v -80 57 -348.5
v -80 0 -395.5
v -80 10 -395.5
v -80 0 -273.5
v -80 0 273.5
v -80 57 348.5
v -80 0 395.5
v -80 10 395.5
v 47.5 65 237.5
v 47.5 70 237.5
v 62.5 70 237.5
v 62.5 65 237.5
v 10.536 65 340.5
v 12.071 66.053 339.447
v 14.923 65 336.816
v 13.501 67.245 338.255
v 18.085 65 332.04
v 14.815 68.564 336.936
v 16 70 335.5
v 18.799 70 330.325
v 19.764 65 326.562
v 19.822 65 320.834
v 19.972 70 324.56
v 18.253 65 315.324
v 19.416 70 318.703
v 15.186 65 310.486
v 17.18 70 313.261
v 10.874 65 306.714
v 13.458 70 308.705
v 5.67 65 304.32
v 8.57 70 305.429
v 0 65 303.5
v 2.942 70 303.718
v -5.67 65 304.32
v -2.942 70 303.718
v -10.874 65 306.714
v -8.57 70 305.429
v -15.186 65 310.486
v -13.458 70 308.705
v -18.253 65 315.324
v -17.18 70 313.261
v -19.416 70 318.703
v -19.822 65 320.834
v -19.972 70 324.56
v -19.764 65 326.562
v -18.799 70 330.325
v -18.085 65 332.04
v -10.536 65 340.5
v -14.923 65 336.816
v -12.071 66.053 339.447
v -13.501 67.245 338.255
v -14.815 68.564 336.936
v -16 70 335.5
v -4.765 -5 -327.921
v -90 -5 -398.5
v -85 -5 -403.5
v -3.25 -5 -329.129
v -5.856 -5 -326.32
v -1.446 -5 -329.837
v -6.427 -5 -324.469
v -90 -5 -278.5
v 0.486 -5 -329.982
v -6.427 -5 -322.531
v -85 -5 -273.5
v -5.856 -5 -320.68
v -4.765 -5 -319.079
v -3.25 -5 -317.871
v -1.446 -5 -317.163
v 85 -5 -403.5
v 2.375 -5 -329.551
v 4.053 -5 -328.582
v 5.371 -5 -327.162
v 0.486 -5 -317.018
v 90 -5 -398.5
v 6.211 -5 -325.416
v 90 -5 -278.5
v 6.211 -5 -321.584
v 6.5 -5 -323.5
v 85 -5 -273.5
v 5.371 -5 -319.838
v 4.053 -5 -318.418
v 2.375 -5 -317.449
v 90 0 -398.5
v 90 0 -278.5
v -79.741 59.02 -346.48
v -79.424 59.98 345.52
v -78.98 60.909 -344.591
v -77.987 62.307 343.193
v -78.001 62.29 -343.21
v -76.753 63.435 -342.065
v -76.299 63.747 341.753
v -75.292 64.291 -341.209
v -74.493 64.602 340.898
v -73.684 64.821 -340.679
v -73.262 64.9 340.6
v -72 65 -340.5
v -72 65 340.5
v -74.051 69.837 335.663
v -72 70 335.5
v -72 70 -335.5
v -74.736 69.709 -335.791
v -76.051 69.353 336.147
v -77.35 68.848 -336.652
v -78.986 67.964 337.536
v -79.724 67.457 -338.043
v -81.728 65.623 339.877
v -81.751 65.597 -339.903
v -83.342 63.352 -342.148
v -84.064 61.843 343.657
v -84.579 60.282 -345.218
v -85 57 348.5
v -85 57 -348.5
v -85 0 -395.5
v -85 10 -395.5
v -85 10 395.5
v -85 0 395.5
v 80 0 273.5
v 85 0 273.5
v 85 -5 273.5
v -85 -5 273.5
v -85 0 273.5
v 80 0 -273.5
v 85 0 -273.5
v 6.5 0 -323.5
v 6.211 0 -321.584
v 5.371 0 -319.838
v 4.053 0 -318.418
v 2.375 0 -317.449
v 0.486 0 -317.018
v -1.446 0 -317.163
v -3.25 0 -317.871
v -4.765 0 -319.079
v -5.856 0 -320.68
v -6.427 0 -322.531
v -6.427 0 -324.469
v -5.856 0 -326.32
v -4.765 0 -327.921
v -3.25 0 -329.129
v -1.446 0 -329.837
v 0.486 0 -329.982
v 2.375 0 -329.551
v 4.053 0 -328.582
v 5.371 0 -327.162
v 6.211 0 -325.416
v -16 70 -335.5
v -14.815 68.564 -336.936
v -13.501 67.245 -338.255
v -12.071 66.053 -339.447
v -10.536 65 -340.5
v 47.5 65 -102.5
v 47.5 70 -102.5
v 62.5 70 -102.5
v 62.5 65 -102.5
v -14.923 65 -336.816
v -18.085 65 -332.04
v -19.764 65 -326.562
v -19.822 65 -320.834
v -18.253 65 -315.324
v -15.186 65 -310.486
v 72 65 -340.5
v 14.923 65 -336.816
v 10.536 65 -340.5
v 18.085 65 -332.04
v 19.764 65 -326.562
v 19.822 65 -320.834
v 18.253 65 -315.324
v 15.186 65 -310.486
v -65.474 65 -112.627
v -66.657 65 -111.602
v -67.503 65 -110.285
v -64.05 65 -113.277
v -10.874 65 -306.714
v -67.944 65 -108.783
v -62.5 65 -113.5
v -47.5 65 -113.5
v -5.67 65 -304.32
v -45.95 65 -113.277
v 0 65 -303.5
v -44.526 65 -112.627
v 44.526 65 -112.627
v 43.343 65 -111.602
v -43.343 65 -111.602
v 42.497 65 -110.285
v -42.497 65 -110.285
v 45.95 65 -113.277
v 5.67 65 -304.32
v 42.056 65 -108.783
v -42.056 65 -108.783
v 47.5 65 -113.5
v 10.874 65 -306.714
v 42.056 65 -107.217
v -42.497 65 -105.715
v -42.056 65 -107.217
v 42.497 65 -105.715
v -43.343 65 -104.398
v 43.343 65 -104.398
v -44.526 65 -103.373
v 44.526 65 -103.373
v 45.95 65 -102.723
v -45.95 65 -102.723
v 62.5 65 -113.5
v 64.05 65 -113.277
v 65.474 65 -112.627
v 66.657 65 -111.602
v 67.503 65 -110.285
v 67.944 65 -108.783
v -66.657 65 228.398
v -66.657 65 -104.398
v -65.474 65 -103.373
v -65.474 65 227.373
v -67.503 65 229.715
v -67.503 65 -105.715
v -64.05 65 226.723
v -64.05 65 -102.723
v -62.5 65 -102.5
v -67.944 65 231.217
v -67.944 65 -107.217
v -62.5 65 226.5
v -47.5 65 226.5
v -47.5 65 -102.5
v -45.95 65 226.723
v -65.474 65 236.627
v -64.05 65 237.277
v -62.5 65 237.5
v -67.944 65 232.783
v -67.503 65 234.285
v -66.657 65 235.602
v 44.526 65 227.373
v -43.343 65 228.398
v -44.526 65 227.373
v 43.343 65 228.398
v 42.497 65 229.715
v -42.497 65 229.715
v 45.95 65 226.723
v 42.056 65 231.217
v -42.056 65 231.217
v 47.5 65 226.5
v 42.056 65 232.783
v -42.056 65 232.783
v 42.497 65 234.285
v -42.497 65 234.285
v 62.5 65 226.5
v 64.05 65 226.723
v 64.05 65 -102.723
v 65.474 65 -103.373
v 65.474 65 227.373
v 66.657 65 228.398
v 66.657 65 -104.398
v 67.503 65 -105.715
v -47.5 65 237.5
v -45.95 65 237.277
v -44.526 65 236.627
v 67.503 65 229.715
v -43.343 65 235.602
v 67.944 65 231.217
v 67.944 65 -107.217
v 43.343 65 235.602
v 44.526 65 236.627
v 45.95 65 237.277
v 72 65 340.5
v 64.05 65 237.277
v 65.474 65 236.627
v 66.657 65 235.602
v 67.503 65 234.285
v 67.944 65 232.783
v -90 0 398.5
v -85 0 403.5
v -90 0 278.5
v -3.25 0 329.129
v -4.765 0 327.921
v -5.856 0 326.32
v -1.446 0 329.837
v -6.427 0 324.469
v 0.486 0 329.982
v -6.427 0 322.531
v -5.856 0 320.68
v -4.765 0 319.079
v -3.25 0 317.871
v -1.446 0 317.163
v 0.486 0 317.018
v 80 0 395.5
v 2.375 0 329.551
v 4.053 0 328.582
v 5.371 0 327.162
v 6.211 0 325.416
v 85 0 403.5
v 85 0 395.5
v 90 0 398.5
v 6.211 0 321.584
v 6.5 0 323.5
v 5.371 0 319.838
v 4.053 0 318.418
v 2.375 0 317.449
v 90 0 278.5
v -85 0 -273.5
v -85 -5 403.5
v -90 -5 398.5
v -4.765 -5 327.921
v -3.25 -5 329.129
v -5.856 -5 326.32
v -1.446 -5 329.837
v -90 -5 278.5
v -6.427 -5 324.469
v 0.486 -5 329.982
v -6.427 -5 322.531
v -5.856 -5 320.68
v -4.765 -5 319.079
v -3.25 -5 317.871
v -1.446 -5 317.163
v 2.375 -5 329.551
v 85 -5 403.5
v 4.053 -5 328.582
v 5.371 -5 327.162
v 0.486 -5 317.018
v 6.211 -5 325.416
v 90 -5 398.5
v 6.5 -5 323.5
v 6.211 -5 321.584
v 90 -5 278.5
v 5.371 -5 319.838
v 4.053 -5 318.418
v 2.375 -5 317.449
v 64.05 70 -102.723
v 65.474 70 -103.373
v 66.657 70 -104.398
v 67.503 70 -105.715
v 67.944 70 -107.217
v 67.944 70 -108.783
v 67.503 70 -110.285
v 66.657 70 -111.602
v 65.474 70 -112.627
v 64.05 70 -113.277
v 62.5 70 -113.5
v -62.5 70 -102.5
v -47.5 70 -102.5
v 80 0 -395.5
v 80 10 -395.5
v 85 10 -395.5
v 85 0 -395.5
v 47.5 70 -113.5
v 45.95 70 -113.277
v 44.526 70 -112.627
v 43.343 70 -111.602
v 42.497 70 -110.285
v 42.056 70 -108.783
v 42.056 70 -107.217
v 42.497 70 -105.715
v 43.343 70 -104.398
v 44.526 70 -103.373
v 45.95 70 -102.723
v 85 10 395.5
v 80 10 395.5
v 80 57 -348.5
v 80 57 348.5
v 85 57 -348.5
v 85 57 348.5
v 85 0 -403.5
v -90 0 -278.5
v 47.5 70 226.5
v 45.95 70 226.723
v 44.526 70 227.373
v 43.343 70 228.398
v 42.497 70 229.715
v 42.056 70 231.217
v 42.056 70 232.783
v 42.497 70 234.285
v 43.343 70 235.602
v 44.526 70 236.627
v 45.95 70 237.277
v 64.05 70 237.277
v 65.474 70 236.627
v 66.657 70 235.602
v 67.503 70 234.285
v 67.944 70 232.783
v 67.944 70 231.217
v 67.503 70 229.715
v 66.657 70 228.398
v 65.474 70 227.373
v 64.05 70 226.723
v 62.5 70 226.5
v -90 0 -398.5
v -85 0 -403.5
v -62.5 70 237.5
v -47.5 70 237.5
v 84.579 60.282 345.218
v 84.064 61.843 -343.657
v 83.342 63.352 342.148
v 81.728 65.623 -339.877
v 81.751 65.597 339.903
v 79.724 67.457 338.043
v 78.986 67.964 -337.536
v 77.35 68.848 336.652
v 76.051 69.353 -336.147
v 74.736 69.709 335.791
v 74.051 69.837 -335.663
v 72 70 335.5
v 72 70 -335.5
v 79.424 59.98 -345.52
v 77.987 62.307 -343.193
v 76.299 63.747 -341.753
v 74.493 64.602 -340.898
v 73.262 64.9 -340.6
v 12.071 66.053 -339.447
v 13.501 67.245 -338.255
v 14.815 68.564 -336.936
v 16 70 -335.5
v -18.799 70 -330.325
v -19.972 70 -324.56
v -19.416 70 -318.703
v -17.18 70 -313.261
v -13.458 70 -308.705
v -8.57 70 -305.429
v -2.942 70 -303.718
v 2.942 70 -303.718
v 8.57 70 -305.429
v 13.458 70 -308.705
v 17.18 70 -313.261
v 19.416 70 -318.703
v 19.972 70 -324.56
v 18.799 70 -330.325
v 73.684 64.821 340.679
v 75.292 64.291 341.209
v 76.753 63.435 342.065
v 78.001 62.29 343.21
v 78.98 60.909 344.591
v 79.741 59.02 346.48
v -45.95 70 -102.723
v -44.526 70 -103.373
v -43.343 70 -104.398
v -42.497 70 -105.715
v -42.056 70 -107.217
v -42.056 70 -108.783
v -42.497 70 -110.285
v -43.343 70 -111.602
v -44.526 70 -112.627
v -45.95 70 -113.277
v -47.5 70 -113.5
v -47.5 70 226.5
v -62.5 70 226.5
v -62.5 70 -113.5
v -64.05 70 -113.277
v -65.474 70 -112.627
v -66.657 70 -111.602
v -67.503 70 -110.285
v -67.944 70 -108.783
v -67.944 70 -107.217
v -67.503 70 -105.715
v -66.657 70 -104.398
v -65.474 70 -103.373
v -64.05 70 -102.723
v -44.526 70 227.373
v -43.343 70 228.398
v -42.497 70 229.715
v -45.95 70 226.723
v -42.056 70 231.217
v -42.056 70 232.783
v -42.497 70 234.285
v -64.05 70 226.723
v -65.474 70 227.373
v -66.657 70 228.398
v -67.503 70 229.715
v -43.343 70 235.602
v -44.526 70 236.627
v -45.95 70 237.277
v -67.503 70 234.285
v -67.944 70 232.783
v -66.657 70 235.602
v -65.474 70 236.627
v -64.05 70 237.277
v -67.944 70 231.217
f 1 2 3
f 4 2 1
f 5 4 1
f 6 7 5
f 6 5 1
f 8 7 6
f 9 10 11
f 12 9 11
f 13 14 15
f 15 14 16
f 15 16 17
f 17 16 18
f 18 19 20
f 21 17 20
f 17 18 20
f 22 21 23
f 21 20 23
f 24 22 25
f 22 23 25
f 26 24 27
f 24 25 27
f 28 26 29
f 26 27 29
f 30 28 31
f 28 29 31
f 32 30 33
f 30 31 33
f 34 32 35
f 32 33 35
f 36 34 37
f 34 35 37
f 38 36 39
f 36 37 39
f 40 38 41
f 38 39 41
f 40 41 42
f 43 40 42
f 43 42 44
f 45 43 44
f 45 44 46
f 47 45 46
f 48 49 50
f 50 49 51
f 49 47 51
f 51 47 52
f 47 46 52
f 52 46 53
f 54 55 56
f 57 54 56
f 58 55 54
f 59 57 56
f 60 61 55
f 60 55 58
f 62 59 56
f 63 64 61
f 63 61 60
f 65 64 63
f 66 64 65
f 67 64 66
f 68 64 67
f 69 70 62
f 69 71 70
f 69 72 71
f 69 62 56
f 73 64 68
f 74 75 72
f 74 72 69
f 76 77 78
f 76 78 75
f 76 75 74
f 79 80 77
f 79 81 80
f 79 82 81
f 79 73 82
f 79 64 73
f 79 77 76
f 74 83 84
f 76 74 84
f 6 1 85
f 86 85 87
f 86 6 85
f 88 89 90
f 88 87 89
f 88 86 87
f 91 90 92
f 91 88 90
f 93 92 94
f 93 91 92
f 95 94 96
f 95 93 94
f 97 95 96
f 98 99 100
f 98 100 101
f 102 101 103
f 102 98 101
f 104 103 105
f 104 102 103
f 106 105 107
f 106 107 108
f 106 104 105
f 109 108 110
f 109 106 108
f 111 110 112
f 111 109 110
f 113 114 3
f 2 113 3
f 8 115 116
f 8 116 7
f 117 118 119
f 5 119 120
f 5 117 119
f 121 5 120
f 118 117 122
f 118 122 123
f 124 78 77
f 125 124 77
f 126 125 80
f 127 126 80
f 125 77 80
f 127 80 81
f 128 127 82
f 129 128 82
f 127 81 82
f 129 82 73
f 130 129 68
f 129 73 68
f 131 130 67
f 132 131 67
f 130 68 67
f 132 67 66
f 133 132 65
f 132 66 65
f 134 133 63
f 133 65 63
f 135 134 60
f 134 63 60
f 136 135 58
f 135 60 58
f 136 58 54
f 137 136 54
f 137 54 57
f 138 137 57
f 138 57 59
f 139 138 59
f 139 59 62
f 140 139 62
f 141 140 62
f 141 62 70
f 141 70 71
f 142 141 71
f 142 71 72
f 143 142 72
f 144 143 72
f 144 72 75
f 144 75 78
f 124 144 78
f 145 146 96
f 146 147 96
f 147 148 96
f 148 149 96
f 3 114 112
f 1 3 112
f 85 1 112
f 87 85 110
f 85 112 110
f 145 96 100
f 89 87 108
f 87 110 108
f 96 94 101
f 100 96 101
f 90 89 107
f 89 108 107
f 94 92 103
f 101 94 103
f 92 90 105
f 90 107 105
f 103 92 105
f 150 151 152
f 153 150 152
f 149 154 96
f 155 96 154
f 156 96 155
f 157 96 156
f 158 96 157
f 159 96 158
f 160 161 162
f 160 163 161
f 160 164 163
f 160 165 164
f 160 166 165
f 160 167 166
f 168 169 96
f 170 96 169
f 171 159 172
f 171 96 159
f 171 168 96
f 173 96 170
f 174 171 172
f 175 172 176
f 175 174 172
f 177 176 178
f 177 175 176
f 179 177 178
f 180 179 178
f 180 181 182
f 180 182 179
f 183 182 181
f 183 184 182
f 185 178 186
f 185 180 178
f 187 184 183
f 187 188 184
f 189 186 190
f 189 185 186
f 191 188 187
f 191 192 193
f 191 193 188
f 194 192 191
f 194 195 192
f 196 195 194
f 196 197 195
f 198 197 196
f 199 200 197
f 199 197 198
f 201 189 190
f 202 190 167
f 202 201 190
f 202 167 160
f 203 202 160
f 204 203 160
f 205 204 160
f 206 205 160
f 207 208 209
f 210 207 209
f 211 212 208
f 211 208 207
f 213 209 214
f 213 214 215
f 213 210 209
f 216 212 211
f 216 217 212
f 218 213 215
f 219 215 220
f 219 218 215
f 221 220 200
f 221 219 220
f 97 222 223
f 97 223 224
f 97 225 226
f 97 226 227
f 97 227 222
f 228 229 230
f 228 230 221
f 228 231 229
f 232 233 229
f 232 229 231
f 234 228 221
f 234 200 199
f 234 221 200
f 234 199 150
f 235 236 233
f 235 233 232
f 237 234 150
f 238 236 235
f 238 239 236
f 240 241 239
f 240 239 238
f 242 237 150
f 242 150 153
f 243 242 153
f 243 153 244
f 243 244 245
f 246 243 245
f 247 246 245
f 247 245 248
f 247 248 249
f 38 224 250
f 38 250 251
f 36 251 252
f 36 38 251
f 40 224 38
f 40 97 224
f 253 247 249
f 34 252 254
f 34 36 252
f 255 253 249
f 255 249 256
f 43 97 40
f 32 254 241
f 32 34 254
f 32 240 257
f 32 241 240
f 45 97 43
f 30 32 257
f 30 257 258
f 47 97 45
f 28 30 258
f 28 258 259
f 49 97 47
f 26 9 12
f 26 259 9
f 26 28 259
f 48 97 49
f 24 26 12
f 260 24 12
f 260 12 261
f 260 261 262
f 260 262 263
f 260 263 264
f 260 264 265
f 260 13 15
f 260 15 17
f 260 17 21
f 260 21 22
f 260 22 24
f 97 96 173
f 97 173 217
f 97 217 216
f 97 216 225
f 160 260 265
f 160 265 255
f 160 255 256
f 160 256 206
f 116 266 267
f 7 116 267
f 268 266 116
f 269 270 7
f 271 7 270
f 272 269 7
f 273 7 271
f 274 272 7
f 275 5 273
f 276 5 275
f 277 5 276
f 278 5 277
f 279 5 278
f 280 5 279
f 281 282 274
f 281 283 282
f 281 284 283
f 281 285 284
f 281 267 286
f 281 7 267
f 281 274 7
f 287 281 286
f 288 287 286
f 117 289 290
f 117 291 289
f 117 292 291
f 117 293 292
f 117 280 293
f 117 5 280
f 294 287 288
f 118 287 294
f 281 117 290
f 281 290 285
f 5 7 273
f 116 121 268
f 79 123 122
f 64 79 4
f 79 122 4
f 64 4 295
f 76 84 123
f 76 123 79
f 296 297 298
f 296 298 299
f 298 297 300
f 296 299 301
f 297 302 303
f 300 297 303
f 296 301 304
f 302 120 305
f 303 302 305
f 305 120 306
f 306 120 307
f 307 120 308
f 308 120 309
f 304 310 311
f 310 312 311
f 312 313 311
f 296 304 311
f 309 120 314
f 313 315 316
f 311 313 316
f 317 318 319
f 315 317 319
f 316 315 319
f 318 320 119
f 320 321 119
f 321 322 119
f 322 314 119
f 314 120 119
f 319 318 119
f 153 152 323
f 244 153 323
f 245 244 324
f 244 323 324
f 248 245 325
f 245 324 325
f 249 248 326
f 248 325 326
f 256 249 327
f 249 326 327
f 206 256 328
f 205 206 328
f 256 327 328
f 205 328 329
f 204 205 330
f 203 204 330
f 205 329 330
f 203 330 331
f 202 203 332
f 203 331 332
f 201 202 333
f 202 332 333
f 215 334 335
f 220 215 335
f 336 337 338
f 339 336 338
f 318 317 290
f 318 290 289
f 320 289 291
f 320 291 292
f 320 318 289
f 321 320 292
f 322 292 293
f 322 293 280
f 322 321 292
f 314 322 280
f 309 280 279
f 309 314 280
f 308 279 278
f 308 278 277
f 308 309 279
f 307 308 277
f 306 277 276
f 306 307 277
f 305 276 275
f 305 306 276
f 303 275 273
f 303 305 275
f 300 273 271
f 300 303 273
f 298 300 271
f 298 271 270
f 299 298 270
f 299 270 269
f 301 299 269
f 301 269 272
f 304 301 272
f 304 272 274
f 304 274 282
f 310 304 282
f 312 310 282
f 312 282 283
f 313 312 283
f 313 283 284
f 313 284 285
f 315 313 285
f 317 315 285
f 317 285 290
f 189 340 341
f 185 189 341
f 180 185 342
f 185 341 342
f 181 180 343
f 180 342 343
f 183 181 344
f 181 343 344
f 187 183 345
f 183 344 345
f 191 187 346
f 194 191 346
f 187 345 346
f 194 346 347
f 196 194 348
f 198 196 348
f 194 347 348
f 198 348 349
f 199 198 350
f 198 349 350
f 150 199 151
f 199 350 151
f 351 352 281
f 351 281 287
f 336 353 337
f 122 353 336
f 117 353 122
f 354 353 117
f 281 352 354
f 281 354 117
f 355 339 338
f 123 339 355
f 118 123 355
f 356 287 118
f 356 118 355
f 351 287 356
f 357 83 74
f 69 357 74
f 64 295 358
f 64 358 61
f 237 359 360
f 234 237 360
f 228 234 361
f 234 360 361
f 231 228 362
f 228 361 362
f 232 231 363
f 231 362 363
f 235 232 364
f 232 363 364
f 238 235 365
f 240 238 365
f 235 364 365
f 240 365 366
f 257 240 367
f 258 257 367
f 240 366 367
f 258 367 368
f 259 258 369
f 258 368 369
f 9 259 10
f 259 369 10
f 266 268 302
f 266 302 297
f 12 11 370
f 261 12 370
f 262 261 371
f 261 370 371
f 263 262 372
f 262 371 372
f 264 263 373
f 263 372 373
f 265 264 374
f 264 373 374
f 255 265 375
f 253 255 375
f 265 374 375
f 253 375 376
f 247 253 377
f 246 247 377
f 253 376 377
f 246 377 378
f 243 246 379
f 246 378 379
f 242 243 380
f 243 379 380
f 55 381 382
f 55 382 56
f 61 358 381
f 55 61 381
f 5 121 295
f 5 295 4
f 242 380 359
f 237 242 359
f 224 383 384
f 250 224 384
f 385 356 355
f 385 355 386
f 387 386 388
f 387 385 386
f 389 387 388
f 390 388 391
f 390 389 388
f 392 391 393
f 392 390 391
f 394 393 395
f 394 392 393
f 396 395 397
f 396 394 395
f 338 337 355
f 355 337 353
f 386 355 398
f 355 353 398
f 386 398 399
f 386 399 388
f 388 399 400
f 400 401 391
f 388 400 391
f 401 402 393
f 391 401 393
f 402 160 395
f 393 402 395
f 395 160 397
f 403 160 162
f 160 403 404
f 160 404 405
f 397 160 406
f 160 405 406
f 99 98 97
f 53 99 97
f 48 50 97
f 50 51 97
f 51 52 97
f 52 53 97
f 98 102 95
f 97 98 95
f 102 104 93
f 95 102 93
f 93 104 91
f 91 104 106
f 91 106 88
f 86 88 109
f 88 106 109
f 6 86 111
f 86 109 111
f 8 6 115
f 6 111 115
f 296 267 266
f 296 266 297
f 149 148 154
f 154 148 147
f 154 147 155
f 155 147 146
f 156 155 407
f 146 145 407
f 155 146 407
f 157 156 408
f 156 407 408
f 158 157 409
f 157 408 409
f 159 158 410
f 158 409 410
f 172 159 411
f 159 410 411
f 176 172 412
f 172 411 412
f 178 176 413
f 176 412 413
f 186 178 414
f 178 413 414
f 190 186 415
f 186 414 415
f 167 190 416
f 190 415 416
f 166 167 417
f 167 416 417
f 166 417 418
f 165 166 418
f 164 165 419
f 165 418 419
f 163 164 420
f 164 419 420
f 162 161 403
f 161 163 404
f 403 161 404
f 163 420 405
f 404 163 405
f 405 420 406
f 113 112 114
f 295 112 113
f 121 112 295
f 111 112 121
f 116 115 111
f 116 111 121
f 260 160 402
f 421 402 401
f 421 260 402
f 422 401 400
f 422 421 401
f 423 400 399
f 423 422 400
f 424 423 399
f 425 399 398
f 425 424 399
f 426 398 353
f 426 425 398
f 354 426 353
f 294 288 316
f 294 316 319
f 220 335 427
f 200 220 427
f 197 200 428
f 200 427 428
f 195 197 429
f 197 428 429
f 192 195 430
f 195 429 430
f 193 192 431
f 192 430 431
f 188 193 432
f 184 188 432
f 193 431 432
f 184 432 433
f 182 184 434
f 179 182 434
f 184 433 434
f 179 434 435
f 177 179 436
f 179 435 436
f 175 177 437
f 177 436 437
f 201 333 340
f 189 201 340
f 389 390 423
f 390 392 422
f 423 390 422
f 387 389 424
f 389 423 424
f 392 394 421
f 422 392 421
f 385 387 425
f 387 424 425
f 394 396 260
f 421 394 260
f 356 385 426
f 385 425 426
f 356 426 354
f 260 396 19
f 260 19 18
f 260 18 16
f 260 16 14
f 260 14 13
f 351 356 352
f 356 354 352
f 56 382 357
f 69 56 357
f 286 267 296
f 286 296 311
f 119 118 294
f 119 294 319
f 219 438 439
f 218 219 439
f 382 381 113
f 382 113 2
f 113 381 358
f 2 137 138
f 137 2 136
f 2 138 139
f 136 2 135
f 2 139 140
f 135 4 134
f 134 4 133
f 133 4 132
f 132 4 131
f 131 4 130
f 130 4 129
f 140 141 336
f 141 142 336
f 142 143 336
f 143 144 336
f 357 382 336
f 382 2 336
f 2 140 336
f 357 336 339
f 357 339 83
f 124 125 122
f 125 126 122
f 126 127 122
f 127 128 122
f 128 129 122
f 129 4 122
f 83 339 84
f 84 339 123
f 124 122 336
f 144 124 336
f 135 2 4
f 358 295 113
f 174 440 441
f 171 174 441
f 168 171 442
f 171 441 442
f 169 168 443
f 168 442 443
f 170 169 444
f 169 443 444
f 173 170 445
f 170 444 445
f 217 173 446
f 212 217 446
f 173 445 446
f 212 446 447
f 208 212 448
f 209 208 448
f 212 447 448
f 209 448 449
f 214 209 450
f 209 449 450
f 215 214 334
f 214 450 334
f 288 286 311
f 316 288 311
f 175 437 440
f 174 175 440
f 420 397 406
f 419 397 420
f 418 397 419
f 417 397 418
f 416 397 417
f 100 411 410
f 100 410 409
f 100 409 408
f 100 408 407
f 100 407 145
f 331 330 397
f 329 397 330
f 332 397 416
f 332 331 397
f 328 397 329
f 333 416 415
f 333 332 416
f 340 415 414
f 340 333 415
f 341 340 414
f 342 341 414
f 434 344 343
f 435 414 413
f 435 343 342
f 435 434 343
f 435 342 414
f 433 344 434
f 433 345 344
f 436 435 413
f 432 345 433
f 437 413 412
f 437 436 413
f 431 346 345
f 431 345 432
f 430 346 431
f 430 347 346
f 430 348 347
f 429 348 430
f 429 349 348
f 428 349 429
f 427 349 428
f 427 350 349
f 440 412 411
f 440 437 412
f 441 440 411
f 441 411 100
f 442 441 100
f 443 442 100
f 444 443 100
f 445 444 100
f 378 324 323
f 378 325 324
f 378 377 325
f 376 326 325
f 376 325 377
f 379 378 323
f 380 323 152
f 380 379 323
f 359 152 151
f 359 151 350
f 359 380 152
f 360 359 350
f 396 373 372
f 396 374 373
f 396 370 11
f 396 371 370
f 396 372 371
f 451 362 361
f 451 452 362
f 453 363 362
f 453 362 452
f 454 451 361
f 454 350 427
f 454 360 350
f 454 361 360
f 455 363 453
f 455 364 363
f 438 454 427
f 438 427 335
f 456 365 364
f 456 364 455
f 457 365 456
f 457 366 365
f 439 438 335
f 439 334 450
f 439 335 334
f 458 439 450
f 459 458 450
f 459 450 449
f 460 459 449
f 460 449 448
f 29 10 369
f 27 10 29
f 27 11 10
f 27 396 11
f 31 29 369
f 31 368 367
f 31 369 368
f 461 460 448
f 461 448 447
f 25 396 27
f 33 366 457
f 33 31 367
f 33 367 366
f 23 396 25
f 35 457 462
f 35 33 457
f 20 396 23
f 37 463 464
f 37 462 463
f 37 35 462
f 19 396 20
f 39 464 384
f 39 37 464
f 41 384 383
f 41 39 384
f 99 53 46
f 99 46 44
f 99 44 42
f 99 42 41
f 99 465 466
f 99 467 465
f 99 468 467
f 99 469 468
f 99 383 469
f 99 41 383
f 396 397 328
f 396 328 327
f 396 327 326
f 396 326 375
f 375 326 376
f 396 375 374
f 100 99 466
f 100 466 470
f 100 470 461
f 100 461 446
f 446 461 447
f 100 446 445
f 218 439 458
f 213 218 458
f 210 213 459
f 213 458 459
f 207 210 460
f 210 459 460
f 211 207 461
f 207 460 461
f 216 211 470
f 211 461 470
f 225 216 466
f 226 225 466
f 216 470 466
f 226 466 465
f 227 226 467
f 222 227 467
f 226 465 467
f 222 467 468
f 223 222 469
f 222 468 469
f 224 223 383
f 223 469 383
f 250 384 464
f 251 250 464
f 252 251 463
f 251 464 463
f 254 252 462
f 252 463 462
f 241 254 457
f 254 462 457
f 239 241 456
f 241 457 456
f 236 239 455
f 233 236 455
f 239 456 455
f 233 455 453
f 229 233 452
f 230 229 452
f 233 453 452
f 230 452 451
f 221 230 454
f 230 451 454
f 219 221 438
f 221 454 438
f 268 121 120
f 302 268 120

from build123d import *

# Parameters (mm, degrees)
F1_DEPTH  = 395.5
F2_R      = 20
F3_DEPTH  = 70.001
F4_W      = 5
F4_H      = 122
F5_DEPTH  = 5
F6_R      = 6.5
F7_DEPTH  = 75.001
F8_SIZE   = 5
F11_DEPTH = 175.001


with BuildPart() as f1:
    # F0 (on Top) → F1 (new body, symmetric)
    with BuildSketch(Plane.XY):
        with BuildLine():
            Line((-85, 57), (-85, 0))
            Line((-85, 0), (-80, 0))
            Line((-80, 0), (-80, 57))
            ThreePointArc((-80, 57), (-77.6568542495, 62.6568542495), (-72, 65))
            Line((-72, 65), (72, 65))
            ThreePointArc((72, 65), (77.6568542495, 62.6568542495), (80, 57))
            Line((80, 57), (80, 0))
            Line((80, 0), (85, 0))
            Line((85, 0), (85, 57))
            ThreePointArc((85, 57), (81.1923881554, 66.1923881554), (72, 70))
            Line((72, 70), (-72, 70))
            ThreePointArc((-72, 70), (-81.1923881554, 66.1923881554), (-85, 57))
        make_face()
    extrude(amount=F1_DEPTH, both=True)

    # F2 (on face) → F3 (cut, through all)
    with BuildSketch(Plane(origin=(0, 70, 0), x_dir=(-1, 0, 0), z_dir=(0, 1, 0))):
        with Locations((0, -323.5)):
            Circle(F2_R)
        with BuildLine():
            Line((-47.5, -102.5), (-62.5, -102.5))
            ThreePointArc((-62.5, -102.5), (-68, -108), (-62.5, -113.5))
            Line((-62.5, -113.5), (-47.5, -113.5))
            ThreePointArc((-47.5, -113.5), (-42, -108), (-47.5, -102.5))
        make_face()
        with Locations((0, 323.5)):
            Circle(F2_R)
        with BuildLine():
            Line((-47.5, 237.5), (-62.5, 237.5))
            ThreePointArc((-62.5, 237.5), (-68, 232), (-62.5, 226.5))
            Line((-62.5, 226.5), (-47.5, 226.5))
            ThreePointArc((-47.5, 226.5), (-42, 232), (-47.5, 237.5))
        make_face()
        with BuildLine():
            Line((47.5, 226.5), (62.5, 226.5))
            ThreePointArc((62.5, 226.5), (68, 232), (62.5, 237.5))
            Line((62.5, 237.5), (47.5, 237.5))
            ThreePointArc((47.5, 237.5), (42, 232), (47.5, 226.5))
        make_face()
        with BuildLine():
            ThreePointArc((62.5, -113.5), (68, -108), (62.5, -102.5))
            Line((62.5, -102.5), (47.5, -102.5))
            ThreePointArc((47.5, -102.5), (42, -108), (47.5, -113.5))
            Line((47.5, -113.5), (62.5, -113.5))
        make_face()
    extrude(amount=-F3_DEPTH, mode=Mode.SUBTRACT)



with BuildPart() as f5:
    # F4 (on face) → F5 (new body)
    with BuildSketch(Plane.XZ):
        Polygon((-90, -273.5), (-90, -403.5), (90, -403.5), (90, -273.5), (-80, -273.5), (-80, -395.5), (-85, -395.5), (-85, -273.5), align=None)
        with Locations((-82.5, -334.5)):
            Rectangle(F4_W, F4_H)
    extrude(amount=F5_DEPTH)

    # F6 (on face) → F7 (cut, through all)
    with BuildSketch(Plane.XZ.offset(5)):
        with Locations((0, -323.5)):
            Circle(F6_R)
    extrude(amount=-F7_DEPTH, mode=Mode.SUBTRACT)

    # F8
    f8_edges = [f5.edges().sort_by_distance(p)[0] for p in [
        (-90, -2.5, -273.5),
        (90, -2.5, -273.5),
        (-90, -2.5, -403.5),
        (90, -2.5, -403.5),
    ]]
    chamfer(f8_edges, length=F8_SIZE)


with BuildPart() as f1_1:
    add(f1.part)

    add(f5.part)  # F9 merges F5
    # F9: F5 across plane
    add(f5.part.mirror(Plane.XY))

    # F10 (on face) → F11 (cut, through all)
    with BuildSketch(Plane(origin=(-85, 0, 0), x_dir=(0, -1, 0), z_dir=(-1, 0, 0))):
        Polygon((-70, -395.5), (-57, -395.5), (-57, -348.5), (-70, -335.5), align=None)
        Polygon((-57, -395.5), (-10, -395.5), (-57, -348.5), align=None)
        Polygon((-70, 335.5), (-57, 348.5), (-57, 395.5), (-70, 395.5), align=None)
        Polygon((-57, 395.5), (-57, 348.5), (-10, 395.5), align=None)
    extrude(amount=-F11_DEPTH, mode=Mode.SUBTRACT)


solid = f1_1.part
